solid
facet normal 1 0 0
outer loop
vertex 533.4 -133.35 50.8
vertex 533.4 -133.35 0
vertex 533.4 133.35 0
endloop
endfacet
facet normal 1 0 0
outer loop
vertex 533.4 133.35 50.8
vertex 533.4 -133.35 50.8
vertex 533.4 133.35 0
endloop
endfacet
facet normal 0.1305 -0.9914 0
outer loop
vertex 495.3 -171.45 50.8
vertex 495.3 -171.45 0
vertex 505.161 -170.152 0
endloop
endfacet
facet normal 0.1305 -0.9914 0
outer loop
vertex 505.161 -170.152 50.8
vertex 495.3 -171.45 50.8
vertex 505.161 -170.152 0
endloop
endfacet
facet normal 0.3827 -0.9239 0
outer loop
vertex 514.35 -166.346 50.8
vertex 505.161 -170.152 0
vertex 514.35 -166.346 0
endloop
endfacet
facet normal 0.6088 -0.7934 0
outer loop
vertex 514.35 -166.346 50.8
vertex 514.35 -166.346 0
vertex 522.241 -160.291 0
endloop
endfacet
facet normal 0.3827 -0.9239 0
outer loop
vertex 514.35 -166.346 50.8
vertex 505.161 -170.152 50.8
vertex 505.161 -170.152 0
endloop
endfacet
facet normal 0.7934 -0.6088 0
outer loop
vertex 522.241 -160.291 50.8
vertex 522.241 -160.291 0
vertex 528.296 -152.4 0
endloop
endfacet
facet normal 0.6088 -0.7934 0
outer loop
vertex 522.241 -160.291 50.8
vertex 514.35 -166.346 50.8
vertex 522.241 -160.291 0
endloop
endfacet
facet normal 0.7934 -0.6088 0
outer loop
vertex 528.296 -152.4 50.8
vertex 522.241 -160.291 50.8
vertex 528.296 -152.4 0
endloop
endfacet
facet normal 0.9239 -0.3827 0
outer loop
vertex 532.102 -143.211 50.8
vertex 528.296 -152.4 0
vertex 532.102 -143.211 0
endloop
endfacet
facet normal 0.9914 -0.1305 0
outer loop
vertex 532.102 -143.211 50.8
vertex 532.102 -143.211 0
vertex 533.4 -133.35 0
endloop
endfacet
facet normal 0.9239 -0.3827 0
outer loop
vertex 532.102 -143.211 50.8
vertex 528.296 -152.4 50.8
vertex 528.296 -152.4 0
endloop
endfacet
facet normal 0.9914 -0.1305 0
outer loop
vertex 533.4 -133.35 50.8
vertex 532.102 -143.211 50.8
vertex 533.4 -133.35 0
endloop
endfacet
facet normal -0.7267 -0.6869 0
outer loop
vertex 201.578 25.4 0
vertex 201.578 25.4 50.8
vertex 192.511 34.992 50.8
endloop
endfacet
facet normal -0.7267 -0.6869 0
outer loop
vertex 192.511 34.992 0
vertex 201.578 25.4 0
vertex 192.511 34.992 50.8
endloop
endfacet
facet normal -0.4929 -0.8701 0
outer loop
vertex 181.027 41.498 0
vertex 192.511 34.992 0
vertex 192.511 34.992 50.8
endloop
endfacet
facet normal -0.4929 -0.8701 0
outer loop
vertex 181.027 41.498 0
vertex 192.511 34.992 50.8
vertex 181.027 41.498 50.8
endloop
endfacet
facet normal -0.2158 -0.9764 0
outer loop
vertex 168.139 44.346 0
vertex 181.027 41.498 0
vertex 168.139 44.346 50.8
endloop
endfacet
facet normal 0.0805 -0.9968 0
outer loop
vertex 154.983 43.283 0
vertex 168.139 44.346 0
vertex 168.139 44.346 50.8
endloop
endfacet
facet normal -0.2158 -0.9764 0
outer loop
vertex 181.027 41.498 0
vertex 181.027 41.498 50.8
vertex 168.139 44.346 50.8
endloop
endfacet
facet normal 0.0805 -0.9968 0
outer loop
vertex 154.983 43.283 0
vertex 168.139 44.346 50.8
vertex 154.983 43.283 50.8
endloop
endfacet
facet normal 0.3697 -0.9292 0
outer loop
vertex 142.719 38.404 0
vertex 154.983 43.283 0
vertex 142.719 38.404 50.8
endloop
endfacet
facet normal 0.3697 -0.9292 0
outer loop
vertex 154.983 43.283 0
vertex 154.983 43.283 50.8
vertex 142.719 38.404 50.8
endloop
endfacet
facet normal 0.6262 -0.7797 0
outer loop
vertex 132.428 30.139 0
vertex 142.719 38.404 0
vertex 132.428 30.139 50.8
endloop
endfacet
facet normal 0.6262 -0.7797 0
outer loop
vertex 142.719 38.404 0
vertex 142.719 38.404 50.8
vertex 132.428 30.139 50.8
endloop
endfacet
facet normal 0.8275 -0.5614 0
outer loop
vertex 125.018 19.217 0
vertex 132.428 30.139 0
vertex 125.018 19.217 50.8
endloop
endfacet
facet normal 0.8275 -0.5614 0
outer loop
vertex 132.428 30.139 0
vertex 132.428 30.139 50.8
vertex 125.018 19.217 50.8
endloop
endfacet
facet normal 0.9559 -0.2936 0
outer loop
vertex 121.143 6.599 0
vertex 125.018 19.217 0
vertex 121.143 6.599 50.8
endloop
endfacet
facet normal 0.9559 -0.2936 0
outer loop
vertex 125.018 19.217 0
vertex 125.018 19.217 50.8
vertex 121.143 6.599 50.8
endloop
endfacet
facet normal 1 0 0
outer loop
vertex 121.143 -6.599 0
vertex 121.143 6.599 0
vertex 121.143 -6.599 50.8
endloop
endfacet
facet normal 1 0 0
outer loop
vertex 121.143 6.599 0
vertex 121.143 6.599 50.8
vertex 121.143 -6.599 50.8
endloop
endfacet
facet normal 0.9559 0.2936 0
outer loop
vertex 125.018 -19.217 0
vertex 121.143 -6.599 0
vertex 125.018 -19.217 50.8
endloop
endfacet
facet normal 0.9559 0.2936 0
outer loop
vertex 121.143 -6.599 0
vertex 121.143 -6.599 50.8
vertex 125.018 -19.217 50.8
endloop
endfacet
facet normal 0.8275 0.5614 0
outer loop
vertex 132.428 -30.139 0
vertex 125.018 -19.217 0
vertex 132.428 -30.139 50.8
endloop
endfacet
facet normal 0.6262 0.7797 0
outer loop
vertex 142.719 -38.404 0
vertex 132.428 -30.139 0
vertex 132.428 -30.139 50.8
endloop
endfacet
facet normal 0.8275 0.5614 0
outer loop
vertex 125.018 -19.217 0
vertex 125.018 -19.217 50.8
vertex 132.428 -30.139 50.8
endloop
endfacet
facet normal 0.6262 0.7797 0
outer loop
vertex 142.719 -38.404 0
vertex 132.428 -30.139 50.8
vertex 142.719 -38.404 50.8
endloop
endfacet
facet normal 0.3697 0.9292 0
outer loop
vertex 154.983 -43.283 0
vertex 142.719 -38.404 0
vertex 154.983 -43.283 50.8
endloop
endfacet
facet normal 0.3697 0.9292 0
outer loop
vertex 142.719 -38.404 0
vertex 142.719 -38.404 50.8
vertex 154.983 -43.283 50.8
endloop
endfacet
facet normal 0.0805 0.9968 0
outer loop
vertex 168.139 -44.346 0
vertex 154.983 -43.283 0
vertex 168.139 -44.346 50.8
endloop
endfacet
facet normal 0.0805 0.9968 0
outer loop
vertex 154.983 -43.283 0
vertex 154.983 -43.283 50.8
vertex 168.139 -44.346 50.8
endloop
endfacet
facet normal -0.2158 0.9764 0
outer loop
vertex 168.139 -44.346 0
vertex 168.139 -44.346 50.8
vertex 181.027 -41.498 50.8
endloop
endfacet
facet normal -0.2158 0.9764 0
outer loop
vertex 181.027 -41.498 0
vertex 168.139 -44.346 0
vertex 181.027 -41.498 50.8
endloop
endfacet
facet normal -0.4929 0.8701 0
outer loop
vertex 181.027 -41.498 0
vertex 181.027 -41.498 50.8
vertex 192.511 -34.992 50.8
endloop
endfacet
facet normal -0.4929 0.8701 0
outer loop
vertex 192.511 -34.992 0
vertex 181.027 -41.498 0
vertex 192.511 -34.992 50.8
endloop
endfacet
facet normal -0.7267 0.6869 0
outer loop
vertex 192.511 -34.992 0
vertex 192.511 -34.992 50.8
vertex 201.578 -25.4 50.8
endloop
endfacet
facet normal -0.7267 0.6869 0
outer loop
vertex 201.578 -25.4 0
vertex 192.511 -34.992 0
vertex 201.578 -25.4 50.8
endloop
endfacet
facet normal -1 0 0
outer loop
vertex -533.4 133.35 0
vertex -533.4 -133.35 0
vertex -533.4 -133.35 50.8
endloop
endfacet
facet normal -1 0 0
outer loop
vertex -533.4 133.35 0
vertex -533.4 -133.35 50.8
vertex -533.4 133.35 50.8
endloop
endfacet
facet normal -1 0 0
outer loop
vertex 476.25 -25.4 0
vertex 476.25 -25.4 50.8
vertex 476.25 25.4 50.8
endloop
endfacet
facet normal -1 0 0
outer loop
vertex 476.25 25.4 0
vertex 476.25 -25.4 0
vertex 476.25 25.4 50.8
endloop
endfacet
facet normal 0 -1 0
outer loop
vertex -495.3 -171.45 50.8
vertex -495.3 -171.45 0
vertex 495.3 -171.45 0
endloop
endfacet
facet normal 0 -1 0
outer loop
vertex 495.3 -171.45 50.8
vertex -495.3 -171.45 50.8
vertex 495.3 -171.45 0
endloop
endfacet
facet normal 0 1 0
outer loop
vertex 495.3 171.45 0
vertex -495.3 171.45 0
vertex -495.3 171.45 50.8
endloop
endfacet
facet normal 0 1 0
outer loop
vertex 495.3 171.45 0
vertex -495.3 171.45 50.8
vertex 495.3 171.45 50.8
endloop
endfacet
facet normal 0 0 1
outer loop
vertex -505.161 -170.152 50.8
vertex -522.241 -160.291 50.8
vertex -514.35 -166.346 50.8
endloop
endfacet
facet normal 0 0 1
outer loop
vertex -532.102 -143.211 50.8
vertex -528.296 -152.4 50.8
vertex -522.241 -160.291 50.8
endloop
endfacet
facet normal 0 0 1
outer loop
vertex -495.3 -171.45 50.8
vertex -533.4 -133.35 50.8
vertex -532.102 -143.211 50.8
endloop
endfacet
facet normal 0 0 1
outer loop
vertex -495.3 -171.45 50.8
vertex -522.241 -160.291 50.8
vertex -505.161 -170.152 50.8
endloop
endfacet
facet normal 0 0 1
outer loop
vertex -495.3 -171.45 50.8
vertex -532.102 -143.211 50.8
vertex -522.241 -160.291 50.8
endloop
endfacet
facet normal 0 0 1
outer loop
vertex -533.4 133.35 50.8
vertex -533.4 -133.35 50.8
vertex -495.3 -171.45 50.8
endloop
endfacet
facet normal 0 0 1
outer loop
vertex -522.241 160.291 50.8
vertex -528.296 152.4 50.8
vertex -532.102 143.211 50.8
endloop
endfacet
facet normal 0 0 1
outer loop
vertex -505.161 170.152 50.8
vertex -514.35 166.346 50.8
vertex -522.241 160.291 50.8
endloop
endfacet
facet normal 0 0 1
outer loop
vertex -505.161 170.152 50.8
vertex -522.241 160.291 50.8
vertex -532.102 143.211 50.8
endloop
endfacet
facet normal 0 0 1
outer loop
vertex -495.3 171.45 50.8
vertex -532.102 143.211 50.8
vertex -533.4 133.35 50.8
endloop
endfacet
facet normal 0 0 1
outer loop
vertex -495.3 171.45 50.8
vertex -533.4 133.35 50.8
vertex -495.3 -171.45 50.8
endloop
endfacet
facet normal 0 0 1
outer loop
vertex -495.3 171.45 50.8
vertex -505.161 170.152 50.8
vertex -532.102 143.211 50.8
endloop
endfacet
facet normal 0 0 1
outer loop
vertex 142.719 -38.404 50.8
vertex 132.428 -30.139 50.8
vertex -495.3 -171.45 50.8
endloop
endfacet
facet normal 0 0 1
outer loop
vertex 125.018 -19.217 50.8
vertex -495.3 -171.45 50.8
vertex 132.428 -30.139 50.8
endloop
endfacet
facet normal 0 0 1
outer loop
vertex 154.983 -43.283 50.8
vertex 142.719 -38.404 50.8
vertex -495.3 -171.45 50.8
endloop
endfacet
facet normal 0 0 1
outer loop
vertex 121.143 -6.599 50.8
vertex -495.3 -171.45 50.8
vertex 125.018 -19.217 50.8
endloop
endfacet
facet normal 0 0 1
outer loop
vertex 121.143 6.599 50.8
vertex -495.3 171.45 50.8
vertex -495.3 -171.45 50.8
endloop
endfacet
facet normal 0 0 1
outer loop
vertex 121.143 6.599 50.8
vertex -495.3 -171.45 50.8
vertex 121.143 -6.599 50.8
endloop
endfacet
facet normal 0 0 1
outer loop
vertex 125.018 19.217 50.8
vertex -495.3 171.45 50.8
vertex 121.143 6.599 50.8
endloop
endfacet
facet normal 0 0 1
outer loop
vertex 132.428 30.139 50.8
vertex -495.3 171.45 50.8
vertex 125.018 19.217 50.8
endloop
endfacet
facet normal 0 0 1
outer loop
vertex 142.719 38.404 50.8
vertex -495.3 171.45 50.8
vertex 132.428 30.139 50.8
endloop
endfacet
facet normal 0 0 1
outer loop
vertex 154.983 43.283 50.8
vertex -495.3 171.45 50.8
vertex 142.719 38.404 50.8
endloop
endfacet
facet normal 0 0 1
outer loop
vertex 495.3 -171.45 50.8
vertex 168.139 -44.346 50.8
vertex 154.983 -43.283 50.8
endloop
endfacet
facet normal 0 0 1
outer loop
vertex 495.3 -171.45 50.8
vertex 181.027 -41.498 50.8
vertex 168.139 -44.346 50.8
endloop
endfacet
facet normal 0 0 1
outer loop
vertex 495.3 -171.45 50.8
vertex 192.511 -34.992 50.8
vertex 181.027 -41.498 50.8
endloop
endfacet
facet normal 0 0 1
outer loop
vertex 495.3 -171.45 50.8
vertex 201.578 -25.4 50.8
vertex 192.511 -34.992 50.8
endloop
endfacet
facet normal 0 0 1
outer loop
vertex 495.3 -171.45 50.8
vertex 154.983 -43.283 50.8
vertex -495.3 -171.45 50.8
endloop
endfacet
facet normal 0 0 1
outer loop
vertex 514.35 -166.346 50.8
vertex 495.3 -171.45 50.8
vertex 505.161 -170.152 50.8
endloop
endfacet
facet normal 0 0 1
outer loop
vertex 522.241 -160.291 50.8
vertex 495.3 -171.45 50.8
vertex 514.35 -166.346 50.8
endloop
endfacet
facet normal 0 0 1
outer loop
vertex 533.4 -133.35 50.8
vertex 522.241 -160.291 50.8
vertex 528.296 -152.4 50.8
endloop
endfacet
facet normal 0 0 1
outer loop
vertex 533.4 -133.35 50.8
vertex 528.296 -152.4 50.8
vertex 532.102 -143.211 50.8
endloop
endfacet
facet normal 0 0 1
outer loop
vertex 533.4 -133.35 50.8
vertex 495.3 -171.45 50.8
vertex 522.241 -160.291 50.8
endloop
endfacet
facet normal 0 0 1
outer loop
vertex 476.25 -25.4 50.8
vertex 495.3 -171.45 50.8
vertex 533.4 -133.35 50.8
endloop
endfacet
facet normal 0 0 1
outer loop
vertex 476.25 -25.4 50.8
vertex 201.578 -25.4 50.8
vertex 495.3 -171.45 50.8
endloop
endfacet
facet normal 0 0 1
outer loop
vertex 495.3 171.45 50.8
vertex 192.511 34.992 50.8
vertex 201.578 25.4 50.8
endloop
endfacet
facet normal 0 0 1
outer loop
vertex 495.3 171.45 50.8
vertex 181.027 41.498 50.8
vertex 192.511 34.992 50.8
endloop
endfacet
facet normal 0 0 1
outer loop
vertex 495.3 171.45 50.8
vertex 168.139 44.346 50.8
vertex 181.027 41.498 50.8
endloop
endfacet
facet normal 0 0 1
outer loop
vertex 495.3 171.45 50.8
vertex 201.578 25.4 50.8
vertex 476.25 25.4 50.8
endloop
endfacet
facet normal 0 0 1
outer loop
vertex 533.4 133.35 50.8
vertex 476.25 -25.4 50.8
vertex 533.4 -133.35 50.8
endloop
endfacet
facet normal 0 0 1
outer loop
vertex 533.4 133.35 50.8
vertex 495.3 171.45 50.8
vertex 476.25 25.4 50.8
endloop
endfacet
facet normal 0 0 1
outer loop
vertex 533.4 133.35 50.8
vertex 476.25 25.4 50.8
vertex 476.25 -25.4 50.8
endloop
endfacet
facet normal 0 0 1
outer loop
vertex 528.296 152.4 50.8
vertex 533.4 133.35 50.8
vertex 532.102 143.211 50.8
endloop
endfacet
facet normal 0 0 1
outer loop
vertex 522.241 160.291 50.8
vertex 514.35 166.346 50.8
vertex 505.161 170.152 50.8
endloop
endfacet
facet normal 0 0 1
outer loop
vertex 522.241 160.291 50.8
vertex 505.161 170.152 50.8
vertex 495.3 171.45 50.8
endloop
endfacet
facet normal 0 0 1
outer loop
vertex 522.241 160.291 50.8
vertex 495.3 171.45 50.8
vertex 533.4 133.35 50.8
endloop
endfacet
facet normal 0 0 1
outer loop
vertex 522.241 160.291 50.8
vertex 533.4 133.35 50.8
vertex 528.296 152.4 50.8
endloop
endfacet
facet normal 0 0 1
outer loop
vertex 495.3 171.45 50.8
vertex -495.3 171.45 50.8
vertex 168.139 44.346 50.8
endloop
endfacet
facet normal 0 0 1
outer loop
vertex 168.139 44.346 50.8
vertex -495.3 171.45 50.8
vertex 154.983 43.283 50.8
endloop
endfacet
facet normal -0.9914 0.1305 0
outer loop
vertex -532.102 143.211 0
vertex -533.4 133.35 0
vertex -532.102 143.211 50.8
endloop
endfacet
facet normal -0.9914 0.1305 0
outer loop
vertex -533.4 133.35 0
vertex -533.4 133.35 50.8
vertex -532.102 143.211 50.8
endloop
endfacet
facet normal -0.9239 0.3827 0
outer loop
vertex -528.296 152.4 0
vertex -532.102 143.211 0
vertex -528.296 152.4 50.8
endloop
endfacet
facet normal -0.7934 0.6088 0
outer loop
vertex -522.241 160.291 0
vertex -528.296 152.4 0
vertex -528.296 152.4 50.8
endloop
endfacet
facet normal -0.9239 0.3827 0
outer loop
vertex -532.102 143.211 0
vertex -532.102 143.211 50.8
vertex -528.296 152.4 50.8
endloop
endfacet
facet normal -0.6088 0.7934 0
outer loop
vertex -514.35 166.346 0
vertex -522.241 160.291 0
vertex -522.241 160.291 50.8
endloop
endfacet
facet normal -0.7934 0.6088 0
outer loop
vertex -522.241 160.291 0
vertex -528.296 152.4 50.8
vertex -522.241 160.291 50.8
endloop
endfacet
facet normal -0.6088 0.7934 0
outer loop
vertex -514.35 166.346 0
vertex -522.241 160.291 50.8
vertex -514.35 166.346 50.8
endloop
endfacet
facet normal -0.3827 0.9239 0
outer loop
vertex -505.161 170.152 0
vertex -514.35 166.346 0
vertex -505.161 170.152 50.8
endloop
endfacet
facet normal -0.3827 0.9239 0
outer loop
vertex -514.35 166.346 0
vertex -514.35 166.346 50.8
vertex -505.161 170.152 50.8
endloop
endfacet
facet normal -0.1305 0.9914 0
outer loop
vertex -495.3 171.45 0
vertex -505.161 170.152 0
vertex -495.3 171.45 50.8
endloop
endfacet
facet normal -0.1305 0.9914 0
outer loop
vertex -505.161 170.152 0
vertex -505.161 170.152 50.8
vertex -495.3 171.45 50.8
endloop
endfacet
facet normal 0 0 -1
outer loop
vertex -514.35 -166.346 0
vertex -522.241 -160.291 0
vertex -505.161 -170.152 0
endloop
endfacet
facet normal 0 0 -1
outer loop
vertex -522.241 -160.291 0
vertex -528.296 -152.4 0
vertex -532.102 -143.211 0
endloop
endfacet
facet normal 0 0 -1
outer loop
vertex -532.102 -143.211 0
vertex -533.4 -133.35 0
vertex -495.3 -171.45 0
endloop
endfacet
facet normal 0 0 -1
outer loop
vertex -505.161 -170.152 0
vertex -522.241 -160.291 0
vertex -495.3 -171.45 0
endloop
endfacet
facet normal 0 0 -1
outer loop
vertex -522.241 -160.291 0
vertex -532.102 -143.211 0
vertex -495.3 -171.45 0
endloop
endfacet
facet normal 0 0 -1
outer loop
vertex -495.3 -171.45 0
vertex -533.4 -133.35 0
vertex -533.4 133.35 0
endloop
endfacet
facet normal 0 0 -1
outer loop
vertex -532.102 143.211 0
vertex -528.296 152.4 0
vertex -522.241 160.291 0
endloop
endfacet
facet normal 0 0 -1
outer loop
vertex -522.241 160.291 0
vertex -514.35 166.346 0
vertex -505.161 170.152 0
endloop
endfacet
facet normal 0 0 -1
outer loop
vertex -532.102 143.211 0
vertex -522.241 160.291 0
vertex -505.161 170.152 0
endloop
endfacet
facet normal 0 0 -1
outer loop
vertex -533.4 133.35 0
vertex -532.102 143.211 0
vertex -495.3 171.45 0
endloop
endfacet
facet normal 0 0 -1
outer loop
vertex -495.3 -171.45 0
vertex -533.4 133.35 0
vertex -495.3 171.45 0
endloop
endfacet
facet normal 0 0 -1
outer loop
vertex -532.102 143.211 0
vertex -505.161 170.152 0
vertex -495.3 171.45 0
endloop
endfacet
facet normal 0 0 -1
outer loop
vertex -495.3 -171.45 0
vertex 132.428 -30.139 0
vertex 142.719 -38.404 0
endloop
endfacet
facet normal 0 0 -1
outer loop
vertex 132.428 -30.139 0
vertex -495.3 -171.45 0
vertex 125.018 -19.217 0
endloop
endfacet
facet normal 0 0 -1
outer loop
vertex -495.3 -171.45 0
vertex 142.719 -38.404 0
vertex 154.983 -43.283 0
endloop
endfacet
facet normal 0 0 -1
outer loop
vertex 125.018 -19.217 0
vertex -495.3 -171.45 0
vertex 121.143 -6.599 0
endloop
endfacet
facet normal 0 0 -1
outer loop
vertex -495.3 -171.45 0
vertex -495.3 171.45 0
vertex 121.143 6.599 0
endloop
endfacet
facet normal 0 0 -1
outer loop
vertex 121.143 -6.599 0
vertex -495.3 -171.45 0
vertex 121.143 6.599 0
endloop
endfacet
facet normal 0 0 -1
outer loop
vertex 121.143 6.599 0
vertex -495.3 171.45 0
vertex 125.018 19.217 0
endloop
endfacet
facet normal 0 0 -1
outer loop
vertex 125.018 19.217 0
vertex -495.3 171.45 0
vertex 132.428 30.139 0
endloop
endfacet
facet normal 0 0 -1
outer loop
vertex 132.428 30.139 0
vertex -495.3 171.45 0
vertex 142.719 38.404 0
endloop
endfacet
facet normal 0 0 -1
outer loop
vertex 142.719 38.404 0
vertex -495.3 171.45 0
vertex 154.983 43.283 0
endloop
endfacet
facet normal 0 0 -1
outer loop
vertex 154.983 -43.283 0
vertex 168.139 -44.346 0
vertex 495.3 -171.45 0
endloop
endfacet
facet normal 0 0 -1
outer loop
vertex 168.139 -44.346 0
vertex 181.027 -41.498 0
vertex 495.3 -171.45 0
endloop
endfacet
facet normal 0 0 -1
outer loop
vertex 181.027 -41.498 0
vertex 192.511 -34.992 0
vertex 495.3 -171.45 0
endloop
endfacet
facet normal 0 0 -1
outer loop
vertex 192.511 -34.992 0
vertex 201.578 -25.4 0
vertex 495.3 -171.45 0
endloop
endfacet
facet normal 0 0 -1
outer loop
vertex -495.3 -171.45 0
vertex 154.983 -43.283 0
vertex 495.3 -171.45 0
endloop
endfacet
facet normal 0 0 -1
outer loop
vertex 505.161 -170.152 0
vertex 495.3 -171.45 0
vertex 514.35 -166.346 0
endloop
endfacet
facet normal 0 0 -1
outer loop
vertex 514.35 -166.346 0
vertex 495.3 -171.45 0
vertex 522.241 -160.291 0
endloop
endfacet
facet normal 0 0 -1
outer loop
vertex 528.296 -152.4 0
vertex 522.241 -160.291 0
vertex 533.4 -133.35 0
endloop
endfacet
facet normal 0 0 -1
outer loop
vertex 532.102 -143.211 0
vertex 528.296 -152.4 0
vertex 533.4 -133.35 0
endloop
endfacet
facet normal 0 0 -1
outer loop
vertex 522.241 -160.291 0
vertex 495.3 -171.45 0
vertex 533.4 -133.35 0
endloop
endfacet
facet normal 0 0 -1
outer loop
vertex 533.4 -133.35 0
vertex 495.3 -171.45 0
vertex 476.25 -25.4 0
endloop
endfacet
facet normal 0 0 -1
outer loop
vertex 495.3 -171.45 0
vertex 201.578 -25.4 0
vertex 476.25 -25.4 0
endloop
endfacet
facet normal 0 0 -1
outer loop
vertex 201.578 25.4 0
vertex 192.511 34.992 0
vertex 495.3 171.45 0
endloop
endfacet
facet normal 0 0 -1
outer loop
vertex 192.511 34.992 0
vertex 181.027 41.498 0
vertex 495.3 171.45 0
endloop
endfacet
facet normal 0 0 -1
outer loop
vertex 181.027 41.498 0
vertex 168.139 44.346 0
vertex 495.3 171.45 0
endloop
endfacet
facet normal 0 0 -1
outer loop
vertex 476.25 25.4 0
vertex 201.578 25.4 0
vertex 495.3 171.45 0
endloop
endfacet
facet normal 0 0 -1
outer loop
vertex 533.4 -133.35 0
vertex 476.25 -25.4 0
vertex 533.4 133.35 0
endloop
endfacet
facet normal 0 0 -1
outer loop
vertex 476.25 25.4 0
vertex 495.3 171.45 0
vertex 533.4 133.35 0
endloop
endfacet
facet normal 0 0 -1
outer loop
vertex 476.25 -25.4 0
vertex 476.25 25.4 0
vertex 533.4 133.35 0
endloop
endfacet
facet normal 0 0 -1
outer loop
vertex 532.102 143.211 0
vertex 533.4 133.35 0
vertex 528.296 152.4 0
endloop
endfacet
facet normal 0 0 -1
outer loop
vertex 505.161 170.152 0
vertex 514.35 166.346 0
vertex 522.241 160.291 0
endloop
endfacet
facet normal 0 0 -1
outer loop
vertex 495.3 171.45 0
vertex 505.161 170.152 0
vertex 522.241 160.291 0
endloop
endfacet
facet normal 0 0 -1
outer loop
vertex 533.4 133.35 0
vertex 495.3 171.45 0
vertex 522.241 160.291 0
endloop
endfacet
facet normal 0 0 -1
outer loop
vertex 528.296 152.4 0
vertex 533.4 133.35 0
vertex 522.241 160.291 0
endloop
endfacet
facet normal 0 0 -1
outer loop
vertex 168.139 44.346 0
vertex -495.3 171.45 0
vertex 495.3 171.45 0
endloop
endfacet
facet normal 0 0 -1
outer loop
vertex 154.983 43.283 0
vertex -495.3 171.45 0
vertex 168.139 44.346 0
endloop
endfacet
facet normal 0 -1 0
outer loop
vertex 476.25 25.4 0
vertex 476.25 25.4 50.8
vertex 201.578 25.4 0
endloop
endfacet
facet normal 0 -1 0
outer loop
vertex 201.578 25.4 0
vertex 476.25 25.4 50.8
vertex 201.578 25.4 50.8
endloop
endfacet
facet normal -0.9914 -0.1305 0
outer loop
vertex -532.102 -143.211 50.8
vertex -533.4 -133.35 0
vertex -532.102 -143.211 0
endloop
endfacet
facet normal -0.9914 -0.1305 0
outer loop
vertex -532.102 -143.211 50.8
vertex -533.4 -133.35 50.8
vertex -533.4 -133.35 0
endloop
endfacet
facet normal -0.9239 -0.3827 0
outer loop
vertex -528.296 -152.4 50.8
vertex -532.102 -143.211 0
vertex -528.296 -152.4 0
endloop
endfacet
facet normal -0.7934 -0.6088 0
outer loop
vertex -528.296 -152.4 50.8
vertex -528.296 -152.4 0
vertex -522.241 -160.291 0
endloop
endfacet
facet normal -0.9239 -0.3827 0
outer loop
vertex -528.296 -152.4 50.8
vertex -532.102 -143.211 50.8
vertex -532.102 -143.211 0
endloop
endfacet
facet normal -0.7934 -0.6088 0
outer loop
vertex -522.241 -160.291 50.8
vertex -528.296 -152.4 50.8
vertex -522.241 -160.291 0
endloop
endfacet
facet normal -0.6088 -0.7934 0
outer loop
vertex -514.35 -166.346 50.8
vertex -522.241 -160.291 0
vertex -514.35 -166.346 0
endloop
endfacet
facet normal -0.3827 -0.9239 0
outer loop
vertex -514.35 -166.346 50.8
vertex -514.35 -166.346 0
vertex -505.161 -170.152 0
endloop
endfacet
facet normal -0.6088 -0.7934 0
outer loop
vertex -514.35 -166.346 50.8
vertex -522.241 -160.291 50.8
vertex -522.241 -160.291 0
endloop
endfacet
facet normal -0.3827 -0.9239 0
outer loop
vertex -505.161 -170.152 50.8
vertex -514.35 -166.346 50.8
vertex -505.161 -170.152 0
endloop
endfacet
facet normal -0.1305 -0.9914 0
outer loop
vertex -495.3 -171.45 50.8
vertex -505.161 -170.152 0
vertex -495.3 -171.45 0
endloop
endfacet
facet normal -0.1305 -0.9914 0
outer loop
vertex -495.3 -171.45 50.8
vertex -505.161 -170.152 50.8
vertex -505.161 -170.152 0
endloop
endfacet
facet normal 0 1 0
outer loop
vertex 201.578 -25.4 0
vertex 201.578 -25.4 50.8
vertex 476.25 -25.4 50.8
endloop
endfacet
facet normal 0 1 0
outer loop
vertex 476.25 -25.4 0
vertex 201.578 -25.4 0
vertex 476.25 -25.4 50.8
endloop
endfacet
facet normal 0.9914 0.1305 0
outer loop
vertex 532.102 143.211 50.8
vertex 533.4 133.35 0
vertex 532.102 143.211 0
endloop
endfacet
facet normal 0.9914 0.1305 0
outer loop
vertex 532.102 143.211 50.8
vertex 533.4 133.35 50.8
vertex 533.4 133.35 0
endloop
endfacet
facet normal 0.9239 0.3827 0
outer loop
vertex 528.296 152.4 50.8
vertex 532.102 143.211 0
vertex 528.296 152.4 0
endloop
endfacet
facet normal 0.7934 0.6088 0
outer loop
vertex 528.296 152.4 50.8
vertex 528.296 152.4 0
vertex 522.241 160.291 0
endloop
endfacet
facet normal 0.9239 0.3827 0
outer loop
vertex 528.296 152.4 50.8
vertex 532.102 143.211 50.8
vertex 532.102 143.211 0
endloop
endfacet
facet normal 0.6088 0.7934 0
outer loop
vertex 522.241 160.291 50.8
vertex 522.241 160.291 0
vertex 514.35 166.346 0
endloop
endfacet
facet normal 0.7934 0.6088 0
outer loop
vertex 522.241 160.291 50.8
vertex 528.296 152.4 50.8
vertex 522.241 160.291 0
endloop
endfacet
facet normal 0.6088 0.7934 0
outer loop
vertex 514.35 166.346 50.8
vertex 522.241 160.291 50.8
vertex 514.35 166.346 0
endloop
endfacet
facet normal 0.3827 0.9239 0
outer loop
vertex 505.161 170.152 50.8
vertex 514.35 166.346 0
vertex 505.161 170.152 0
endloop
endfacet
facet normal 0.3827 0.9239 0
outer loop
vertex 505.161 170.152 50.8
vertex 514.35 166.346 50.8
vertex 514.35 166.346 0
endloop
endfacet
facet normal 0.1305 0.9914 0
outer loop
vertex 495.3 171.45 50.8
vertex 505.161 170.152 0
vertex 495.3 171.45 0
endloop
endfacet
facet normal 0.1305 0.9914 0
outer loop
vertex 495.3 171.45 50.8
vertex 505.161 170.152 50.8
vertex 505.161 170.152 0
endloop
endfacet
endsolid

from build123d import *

# Parameters (mm, degrees)
F0_W     = 1066.8
F0_H     = 342.9
F1_DEPTH = 50.8
F2_R     = 38.1
F4_DEPTH = 50.8


with BuildPart() as f1:
    # F0 (on Top) → F1 (new body)
    with BuildSketch(Plane.XY):
        Rectangle(F0_W, F0_H)
    extrude(amount=F1_DEPTH)

    # F2
    f2_edges = [f1.edges().sort_by_distance(p)[0] for p in [
        (-533.4, 171.45, 25.4),
        (-533.4, -171.45, 25.4),
        (533.4, 171.45, 25.4),
        (533.4, -171.45, 25.4),
    ]]
    fillet(f2_edges, radius=F2_R)

    # F3 (on face) → F4 (cut)
    with BuildSketch(Plane.XY.offset(50.8)):
        with BuildLine():
            ThreePointArc((201.577973, -25.4), (207.51019, -13.310834), (209.55, 0))
            ThreePointArc((209.55, 0), (207.51019, 13.310834), (201.577973, 25.4))
            ThreePointArc((201.577973, 25.4), (120.65, 0), (201.577973, -25.4))
        make_face()
        with BuildLine():
            ThreePointArc((201.577973, 25.4), (207.51019, 13.310834), (209.55, 0))
            ThreePointArc((209.55, 0), (207.51019, -13.310834), (201.577973, -25.4))
            Line((201.577973, -25.4), (476.25, -25.4))
            Line((476.25, -25.4), (476.25, 25.4))
            Line((476.25, 25.4), (201.577973, 25.4))
        make_face()
    extrude(amount=-F4_DEPTH, mode=Mode.SUBTRACT)


solid = f1.part
